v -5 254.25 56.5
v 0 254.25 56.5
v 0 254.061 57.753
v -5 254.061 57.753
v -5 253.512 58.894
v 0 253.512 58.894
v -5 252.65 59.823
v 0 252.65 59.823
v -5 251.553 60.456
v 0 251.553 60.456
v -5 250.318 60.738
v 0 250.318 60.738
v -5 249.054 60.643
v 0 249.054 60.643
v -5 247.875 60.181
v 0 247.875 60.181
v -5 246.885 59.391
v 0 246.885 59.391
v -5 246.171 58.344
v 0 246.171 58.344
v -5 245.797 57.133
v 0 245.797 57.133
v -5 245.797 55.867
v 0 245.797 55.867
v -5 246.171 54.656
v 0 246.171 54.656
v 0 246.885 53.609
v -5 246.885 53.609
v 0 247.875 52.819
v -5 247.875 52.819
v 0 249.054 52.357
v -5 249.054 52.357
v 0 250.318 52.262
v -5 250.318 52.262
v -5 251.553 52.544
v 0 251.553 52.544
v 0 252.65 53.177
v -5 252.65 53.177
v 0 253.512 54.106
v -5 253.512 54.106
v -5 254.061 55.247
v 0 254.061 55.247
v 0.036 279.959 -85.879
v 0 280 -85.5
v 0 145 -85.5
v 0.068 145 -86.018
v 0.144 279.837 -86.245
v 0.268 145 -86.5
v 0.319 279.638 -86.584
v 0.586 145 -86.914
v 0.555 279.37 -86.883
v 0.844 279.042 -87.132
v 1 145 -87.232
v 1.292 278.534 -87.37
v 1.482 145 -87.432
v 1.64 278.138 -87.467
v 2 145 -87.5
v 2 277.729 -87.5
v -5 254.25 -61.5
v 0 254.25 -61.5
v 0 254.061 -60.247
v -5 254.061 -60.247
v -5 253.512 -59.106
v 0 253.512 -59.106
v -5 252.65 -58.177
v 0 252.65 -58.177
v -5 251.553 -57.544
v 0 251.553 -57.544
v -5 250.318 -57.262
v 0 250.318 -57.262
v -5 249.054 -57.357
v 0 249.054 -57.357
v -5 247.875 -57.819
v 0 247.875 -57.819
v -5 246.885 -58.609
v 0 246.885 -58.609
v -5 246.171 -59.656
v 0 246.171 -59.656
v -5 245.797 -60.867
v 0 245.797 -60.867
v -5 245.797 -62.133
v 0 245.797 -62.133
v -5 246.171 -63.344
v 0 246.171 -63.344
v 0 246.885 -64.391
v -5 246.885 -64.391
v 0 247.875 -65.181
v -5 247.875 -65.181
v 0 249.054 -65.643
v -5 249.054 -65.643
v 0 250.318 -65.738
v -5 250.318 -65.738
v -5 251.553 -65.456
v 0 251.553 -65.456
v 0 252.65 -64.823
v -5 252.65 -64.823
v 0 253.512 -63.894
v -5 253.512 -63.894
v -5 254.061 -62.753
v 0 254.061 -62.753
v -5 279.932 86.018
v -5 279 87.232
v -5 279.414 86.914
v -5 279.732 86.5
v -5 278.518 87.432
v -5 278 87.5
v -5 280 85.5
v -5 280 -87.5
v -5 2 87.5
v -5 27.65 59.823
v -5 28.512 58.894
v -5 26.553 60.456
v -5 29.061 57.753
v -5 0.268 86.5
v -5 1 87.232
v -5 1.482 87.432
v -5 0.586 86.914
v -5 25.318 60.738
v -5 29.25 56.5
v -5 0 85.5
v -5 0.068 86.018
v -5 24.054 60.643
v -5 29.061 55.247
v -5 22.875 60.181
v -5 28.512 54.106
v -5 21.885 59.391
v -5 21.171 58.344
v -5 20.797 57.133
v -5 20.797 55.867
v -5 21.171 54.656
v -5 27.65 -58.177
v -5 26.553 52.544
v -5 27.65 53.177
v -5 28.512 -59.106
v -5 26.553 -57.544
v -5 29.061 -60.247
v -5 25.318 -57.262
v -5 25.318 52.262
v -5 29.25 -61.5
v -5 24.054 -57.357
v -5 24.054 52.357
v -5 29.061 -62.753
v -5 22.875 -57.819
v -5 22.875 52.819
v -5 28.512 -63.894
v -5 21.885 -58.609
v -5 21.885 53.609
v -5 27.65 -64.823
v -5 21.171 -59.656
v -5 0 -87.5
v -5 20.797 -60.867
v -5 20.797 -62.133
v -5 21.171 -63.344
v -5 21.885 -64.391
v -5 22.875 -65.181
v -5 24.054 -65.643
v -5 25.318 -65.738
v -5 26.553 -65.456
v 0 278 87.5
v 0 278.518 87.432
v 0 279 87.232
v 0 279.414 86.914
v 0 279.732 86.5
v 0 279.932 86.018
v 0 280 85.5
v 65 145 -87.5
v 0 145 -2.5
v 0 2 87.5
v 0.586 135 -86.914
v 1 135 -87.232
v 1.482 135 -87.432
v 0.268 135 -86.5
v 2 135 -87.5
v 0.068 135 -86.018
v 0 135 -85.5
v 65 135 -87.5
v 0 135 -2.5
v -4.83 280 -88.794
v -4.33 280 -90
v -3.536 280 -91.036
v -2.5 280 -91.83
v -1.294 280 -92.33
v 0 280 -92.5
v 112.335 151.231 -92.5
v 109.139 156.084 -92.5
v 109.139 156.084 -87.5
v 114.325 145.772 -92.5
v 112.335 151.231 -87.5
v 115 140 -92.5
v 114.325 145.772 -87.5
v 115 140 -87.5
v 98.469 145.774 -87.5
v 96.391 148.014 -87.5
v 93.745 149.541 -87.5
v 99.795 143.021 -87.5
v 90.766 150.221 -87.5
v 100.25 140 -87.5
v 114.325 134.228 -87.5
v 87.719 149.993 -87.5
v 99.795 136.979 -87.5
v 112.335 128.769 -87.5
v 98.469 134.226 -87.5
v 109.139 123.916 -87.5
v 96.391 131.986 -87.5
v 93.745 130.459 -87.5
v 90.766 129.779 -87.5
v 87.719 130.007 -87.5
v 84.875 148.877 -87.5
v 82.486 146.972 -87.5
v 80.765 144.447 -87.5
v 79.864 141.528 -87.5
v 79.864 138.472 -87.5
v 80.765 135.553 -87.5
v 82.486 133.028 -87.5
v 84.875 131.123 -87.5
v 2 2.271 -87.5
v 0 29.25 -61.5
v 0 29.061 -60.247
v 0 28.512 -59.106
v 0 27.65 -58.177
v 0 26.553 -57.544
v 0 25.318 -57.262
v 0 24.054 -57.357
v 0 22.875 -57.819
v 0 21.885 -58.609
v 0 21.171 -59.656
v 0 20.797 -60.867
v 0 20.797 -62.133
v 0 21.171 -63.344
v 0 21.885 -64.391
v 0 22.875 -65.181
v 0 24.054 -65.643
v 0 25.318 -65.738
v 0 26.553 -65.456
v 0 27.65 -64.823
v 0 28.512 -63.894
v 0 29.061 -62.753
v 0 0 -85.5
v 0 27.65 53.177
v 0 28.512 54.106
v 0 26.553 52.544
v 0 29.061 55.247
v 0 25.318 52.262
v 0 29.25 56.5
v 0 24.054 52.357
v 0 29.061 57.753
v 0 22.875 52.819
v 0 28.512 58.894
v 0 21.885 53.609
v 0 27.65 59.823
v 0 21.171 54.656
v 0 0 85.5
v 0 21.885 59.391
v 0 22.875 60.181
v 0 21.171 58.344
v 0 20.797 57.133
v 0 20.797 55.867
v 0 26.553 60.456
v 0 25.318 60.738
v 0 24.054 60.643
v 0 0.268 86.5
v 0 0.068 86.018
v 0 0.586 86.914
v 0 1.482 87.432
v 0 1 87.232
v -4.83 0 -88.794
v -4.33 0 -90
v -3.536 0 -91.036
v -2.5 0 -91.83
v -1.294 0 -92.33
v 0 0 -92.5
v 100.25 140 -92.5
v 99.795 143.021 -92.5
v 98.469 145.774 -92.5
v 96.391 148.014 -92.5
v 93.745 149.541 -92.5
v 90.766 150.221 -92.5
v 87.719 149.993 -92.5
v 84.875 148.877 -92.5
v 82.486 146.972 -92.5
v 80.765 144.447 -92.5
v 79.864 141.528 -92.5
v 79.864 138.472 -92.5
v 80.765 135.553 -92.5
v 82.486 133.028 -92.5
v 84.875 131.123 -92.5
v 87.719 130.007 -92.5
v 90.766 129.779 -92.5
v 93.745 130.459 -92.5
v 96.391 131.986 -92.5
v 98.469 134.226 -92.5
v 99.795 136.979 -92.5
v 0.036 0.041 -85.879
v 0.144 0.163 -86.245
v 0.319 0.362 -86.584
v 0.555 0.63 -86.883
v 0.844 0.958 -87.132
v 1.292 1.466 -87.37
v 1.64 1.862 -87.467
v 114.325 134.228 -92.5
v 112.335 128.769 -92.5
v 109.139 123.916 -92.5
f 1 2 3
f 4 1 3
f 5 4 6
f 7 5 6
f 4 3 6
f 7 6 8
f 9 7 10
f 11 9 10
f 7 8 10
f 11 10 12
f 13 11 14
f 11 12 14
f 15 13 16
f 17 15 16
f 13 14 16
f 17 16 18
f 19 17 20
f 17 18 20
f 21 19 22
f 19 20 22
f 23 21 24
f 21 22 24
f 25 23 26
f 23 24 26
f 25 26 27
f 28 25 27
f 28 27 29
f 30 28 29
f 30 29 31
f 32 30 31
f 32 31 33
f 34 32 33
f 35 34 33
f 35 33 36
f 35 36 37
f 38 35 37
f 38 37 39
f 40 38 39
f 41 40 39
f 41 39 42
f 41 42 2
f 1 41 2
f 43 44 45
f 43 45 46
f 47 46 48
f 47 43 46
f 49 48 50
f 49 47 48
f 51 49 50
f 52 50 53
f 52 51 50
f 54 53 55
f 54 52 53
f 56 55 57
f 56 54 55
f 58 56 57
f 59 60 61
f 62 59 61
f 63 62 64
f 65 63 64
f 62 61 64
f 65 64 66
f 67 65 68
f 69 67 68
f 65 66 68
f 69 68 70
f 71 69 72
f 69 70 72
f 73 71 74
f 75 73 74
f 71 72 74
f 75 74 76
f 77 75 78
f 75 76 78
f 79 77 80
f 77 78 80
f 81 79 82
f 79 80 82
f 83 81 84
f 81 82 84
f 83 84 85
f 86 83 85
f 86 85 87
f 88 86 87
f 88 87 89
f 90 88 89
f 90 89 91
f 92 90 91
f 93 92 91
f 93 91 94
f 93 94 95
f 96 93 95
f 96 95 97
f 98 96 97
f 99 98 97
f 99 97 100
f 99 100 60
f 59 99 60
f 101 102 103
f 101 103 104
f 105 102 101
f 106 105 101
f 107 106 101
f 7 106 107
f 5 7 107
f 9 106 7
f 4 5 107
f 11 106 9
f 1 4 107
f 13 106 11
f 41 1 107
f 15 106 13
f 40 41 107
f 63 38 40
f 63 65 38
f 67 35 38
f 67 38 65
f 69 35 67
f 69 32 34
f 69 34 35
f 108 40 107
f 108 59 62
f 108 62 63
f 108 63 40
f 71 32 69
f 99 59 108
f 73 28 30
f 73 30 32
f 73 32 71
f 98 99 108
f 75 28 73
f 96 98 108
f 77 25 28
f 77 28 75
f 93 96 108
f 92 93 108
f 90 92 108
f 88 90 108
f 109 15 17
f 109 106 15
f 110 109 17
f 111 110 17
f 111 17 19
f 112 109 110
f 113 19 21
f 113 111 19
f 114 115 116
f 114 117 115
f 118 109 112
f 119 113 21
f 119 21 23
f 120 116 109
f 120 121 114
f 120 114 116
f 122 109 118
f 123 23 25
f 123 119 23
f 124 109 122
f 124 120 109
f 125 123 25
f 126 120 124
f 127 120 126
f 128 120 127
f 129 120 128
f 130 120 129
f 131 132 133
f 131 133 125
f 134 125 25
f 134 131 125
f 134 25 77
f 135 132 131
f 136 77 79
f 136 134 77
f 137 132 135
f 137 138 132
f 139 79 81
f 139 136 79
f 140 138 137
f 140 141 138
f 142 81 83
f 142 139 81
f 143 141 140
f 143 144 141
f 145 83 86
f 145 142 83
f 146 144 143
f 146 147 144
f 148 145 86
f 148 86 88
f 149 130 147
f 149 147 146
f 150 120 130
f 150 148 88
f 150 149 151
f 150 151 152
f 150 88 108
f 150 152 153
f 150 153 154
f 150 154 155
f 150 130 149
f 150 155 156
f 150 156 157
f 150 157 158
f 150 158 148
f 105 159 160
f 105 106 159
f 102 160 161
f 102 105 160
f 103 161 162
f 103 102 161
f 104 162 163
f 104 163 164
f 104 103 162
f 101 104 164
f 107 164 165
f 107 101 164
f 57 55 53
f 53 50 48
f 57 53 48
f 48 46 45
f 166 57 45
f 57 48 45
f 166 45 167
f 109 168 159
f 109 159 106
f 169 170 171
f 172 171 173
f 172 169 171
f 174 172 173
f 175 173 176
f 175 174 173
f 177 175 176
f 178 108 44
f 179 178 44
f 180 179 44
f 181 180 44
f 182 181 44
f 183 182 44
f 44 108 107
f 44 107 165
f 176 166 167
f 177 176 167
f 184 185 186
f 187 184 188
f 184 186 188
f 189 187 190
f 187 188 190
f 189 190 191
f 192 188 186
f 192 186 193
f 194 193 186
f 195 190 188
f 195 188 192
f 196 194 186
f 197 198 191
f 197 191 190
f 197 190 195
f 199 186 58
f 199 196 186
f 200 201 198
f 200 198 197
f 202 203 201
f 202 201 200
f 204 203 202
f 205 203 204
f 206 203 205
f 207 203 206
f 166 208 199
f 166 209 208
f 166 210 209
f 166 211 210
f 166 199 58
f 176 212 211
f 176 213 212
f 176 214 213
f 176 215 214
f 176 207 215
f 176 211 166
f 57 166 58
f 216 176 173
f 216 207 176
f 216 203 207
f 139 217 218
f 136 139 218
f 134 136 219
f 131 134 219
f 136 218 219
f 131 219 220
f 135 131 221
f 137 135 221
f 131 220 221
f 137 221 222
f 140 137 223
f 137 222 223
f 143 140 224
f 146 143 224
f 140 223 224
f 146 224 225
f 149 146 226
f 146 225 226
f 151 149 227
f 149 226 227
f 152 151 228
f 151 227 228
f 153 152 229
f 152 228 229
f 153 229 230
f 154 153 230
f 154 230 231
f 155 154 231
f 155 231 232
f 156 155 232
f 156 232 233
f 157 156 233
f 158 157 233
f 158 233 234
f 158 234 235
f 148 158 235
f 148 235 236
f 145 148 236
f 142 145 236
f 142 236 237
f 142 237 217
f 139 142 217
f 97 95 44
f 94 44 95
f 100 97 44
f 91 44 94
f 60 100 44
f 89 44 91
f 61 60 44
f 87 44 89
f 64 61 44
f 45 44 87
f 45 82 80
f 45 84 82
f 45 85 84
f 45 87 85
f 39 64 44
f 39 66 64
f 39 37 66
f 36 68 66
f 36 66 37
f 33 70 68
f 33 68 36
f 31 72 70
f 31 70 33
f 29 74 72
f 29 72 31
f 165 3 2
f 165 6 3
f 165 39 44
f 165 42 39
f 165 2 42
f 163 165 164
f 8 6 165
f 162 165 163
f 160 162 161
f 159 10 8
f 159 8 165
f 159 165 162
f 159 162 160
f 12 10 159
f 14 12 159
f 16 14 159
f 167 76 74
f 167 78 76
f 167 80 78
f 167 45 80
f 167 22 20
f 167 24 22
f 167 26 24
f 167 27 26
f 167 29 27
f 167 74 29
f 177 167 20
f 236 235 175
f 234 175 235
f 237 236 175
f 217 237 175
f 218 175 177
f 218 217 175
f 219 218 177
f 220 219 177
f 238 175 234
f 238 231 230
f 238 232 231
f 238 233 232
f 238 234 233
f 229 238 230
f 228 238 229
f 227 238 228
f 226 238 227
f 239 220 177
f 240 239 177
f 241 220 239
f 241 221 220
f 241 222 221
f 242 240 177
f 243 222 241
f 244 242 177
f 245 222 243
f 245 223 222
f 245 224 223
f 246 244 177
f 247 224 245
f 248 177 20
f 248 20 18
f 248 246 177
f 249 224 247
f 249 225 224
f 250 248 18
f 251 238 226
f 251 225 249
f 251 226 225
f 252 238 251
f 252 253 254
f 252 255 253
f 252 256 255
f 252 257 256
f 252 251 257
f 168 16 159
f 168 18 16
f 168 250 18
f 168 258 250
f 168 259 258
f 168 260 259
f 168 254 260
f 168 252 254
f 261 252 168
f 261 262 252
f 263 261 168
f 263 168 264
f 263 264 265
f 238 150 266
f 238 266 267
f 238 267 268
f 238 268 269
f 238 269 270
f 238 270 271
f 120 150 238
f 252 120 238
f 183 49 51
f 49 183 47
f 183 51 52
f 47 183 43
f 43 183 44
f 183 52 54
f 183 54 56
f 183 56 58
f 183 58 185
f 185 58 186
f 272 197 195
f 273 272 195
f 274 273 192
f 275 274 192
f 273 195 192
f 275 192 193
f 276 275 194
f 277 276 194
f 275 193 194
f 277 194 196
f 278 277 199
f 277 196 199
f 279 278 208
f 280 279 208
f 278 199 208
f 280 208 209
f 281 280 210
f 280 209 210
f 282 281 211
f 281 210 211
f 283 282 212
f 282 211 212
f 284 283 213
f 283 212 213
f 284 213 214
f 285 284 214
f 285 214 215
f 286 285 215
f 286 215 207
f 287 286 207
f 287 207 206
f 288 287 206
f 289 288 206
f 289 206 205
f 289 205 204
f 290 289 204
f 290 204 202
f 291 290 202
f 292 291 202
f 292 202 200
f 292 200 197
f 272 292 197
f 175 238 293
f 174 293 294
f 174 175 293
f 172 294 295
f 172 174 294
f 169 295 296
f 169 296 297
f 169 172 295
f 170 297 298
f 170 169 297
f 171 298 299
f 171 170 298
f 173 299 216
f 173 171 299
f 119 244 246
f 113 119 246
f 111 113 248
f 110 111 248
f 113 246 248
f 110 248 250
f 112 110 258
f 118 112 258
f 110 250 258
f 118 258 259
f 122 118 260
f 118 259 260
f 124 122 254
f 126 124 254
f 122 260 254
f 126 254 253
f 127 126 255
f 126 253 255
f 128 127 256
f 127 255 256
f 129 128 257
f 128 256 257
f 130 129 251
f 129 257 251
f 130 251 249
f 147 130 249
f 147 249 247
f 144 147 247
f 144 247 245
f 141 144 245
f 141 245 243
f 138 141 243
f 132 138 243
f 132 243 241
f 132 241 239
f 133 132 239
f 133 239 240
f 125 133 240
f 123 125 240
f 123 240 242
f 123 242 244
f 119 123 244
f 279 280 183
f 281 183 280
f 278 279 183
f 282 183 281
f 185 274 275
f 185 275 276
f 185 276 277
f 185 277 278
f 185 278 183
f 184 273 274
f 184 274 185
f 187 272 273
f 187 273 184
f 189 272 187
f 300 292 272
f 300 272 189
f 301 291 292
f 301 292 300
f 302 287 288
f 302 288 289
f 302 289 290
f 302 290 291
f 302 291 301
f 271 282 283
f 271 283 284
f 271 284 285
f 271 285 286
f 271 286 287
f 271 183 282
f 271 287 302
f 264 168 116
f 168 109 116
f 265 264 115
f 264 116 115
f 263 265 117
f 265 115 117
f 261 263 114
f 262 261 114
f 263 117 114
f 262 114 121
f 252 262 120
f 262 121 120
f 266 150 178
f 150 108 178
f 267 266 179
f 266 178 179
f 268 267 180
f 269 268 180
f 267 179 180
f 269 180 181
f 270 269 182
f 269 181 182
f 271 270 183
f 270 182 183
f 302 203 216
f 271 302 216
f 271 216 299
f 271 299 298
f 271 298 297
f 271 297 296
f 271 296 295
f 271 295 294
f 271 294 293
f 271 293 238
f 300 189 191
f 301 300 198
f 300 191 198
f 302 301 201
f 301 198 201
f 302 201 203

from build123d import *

# Parameters (mm, degrees)
F1_DEPTH  = 280
F2_R      = 2
F3_R      = 4.25
F4_DEPTH  = 5.001
F5_W      = 10
F5_H      = 85
F6_DEPTH  = 65
F8_DEPTH  = 145.001
F9_R      = 10.25
F10_DEPTH = 5.001
F11_R     = 5
F12_R     = 2


# Not quite as in the source:
# - a feature names something its author has since deleted; it is built from what else it names


with BuildPart() as f1:
    # F0 (on Front) → F1 (new body)
    with BuildSketch(Plane.XZ):
        Polygon((0, 87.5), (-5, 87.5), (-5, -92.5), (115, -92.5), (115, -87.5), (0, -87.5), align=None)
    extrude(amount=-F1_DEPTH)

    # F2
    f2_edges = [f1.edges().sort_by_distance(p)[0] for p in [
        (-2.5, 280, 87.5),
        (-2.5, 0, 87.5),
    ]]
    fillet(f2_edges, radius=F2_R)

    # F3 (on face) → F4 (cut, through all)
    with BuildSketch(Plane.YZ):
        with Locations((25, 56.5)):
            Circle(F3_R)
        with Locations((25, -61.5)):
            Circle(F3_R)
        with Locations((250, -61.5)):
            Circle(F3_R)
        with Locations((250, 56.5)):
            Circle(F3_R)
    extrude(amount=-F4_DEPTH, mode=Mode.SUBTRACT)

    # F5 (on face) → F6 (join)
    with BuildSketch(Plane.YZ):
        with Locations((140, -45)):
            Rectangle(F5_W, F5_H)
    extrude(amount=F6_DEPTH)

    # F7 (on face) → F8 (cut, through all)
    with BuildSketch(Plane(origin=(0, 145, 0), x_dir=(-1, 0, 0), z_dir=(0, 1, 0))):
        Polygon((-65, -87.5), (0, -2.5), (-65, -2.5), align=None)
    extrude(amount=-F8_DEPTH, mode=Mode.SUBTRACT)

    # F9 (on face) → F10 (cut, through all)
    with BuildSketch(Plane.XY.offset(-87.5)):
        with Locations((90, 140)):
            Circle(F9_R)
        with BuildLine():
            ThreePointArc((109.1388440622, 156.0842981806), (113.4890517215, 148.5594654753), (115, 140))
            Line((115, 140), (115, 280))
            Line((115, 280), (0, 280))
            Line((0, 280), (109.1388440622, 156.0842981806))
        make_face()
        with BuildLine():
            ThreePointArc((115, 140), (113.4890517215, 131.4405345247), (109.1388440622, 123.9157018194))
            Line((109.1388440622, 123.9157018194), (0, 0))
            Line((0, 0), (115, 0))
            Line((115, 0), (115, 140))
        make_face()
    extrude(amount=-F10_DEPTH, mode=Mode.SUBTRACT)

    # F11
    f11_edges = [f1.edges().sort_by_distance(p)[0] for p in [
        (-5, 140, -92.5),
    ]]
    fillet(f11_edges, radius=F11_R)

    # F12
    f12_edges = [f1.edges().sort_by_distance(p)[0] for p in [
        (0, 212.5, -87.5),
        (0, 67.5, -87.5),
    ]]
    fillet(f12_edges, radius=F12_R)


solid = f1.part
